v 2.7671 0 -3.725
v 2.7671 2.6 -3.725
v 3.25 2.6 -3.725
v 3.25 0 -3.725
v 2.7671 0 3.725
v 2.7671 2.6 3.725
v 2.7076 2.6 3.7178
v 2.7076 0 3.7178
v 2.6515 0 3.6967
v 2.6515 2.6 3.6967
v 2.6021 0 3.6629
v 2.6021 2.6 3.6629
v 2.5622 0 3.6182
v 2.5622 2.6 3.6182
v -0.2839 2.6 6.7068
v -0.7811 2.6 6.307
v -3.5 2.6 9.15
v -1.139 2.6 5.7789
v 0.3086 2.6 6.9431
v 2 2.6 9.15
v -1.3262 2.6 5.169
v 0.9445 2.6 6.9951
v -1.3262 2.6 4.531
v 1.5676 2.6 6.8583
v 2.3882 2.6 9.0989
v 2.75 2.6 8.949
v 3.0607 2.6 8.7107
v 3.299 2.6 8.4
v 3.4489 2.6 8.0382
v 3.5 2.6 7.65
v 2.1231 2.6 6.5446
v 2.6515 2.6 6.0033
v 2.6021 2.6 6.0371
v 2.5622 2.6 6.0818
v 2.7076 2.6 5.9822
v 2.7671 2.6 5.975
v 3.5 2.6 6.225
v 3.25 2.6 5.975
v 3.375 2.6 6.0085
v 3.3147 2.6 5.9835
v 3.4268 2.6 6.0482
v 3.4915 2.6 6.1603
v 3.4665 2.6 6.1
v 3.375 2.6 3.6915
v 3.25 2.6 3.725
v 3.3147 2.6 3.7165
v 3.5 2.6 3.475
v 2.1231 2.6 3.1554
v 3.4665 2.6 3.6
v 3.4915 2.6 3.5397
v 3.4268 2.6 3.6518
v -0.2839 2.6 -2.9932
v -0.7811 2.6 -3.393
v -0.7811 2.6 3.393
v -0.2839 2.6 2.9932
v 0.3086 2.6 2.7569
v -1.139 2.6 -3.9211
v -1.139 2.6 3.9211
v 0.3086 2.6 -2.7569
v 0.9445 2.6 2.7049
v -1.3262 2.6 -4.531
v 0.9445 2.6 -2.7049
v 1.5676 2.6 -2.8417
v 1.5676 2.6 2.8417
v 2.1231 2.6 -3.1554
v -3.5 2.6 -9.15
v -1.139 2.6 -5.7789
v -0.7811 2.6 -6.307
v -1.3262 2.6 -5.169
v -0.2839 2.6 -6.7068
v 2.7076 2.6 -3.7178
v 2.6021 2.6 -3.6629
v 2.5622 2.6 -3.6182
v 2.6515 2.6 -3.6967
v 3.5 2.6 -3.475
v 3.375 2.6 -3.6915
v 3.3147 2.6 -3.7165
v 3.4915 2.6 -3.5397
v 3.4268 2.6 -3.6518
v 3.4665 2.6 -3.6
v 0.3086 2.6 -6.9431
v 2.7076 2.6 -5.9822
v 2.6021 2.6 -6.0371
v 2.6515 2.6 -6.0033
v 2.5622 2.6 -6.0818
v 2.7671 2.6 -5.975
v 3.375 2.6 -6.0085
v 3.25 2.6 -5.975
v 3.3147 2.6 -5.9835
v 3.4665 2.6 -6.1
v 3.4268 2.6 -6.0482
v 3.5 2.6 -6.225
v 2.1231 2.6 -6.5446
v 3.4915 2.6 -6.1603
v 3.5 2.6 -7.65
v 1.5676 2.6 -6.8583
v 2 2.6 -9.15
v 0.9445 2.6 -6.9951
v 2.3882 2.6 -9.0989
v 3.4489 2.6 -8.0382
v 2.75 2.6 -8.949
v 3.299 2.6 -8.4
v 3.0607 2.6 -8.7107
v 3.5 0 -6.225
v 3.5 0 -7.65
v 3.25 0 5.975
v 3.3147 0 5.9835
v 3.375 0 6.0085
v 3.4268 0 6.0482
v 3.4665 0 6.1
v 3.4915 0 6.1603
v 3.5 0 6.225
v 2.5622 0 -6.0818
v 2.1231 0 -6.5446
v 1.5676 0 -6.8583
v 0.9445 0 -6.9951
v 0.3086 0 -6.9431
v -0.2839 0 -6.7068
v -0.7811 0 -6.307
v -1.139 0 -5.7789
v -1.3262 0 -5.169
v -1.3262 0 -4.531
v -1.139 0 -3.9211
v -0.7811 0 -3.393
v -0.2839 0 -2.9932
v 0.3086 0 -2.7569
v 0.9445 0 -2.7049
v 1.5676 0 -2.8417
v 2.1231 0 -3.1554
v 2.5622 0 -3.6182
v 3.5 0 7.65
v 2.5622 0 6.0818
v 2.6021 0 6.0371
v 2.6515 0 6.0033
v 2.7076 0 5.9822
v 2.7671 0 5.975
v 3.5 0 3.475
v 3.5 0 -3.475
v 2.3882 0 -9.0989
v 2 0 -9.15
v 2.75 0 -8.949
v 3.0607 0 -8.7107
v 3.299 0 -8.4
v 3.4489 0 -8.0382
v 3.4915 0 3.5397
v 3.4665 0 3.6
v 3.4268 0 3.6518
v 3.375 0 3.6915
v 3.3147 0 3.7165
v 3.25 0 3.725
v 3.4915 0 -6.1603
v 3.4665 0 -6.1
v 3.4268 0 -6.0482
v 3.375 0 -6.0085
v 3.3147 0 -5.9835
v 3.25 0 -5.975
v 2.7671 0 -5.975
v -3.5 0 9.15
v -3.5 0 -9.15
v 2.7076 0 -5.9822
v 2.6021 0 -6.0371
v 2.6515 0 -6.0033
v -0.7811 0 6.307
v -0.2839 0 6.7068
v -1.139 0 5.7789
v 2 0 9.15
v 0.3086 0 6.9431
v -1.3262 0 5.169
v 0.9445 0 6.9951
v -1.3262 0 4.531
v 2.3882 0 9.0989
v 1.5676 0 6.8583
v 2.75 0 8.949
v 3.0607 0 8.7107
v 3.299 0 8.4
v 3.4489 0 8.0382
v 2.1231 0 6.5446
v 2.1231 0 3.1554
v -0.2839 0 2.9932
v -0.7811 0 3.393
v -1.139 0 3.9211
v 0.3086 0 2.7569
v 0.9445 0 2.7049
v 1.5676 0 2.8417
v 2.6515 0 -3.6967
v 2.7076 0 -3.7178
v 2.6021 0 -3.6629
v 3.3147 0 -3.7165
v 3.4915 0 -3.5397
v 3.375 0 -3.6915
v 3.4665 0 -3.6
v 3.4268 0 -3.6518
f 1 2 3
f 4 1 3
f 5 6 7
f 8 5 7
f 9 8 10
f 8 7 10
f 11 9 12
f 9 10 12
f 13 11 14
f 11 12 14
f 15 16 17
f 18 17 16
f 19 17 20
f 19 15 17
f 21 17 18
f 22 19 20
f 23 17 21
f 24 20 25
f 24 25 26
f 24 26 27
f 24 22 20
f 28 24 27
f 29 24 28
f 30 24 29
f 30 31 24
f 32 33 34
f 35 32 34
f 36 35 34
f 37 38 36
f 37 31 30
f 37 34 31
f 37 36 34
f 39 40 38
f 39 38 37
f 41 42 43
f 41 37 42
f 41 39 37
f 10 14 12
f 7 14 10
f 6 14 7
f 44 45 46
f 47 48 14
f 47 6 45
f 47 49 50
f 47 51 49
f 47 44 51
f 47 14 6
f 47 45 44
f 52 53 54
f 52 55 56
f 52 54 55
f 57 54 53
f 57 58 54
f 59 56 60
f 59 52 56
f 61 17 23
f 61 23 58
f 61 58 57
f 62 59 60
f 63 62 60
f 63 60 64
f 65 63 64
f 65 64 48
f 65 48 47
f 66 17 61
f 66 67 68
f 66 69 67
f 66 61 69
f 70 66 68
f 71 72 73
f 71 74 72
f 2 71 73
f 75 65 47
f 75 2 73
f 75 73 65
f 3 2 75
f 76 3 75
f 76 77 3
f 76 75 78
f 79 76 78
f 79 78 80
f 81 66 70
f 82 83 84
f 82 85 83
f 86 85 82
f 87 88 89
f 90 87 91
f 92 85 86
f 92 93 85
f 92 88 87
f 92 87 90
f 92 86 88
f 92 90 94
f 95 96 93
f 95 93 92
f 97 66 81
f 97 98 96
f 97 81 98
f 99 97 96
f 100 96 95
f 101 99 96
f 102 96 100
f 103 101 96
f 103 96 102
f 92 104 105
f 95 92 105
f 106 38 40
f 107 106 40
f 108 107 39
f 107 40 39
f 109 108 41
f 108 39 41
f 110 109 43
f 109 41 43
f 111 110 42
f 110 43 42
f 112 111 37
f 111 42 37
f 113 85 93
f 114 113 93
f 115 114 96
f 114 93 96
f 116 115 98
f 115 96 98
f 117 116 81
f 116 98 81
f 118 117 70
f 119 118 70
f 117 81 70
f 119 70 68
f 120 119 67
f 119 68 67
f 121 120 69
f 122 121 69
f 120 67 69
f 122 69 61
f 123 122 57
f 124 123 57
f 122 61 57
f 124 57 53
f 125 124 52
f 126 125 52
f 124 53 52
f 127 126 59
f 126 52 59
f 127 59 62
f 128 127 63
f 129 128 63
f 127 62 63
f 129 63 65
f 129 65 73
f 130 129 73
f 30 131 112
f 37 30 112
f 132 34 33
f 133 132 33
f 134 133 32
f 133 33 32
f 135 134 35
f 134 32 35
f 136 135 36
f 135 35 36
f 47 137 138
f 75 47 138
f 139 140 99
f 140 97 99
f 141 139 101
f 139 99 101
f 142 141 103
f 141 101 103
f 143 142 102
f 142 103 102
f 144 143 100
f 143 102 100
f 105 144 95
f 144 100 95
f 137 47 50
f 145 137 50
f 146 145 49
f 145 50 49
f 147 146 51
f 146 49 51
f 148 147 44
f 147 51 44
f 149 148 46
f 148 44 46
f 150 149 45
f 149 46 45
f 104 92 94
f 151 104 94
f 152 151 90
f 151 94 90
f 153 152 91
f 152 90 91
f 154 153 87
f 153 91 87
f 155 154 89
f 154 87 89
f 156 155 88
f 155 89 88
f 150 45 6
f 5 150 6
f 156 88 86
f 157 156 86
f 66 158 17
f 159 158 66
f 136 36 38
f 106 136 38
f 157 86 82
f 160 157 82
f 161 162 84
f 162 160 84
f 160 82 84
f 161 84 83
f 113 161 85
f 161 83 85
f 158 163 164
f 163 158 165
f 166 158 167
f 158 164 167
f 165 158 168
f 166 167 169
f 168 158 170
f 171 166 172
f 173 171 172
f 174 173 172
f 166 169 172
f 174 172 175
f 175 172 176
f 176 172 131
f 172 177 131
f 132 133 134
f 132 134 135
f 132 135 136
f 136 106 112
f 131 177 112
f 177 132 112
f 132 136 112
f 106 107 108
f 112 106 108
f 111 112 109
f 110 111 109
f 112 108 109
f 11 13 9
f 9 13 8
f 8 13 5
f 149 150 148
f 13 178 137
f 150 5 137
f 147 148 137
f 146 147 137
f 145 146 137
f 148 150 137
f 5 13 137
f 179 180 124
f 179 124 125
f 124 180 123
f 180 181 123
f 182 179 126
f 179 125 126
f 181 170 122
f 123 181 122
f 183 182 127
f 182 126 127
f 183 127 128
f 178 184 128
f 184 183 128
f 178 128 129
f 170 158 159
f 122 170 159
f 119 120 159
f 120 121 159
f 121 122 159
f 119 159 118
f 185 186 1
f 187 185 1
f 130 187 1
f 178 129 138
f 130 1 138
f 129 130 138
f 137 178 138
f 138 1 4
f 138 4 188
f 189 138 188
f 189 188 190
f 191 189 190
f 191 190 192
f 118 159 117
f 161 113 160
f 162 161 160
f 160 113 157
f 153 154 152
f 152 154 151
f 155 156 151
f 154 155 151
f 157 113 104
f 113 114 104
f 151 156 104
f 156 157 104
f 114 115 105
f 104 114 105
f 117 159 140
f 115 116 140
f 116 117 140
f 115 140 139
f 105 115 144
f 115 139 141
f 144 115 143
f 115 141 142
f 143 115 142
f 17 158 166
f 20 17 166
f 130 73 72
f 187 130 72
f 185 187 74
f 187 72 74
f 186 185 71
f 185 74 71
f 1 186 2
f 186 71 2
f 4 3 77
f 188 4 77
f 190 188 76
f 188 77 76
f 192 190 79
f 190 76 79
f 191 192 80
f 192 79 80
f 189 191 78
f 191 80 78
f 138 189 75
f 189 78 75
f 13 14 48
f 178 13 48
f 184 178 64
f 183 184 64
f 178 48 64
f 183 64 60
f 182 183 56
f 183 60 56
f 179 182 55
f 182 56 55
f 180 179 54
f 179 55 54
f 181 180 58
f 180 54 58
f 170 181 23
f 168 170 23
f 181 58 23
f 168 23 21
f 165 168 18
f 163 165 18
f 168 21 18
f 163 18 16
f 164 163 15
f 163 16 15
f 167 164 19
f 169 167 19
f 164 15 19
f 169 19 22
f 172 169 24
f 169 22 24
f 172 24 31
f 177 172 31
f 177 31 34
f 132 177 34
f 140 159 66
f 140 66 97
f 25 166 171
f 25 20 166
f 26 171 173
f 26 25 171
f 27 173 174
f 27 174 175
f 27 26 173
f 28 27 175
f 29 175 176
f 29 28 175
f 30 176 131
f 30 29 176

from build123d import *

# Parameters (mm, degrees)
CROQUIS1_W              = 7
CROQUIS1_H              = 18.3
SALIENTE_EXTRUIR1_DEPTH = 2.6
CORTAR_EXTRUIR2_DEPTH   = 10
REDONDEO1_R             = 1.5


with BuildPart() as part:
    # Croquis1 → Saliente-Extruir1 (new body)
    with BuildSketch(Plane(origin=(0, 0, 0), x_dir=(1, 0, 0), z_dir=(0, 1, 0))):
        Rectangle(CROQUIS1_W, CROQUIS1_H)
    extrude(amount=SALIENTE_EXTRUIR1_DEPTH)

    # Croquis2 → Cortar-Extruir2 (cut)
    with BuildSketch(Plane(origin=(0, 2.6, 0), x_dir=(1, 0, 0), z_dir=(0, 1, 0))):
        with BuildLine():
            ThreePointArc((3.25, 3.725), (3.426776695, 3.651776695), (3.5, 3.475))
            Line((3.5, 3.475), (3.5, 6.225))
            ThreePointArc((3.5, 6.225), (3.426776695, 6.048223305), (3.25, 5.975))
            Line((3.25, 5.975), (2.767072698, 5.975))
            ThreePointArc((2.767072698, 5.975), (2.651546276, 6.003293785), (2.562169292, 6.081770833))
            ThreePointArc((2.562169292, 6.081770833), (-1.35, 4.85), (2.562169292, 3.618229167))
            ThreePointArc((2.562169292, 3.618229167), (2.651546276, 3.696706215), (2.767072698, 3.725))
            Line((2.767072698, 3.725), (3.25, 3.725))
        make_face()
        with BuildLine():
            ThreePointArc((3.5, -3.475), (3.426776695, -3.651776695), (3.25, -3.725))
            Line((3.25, -3.725), (2.767072698, -3.725))
            ThreePointArc((2.767072698, -3.725), (2.651546276, -3.696706215), (2.562169292, -3.618229167))
            ThreePointArc((2.562169292, -3.618229167), (-1.35, -4.85), (2.562169292, -6.081770833))
            ThreePointArc((2.562169292, -6.081770833), (2.651546276, -6.003293785), (2.767072698, -5.975))
            Line((2.767072698, -5.975), (3.25, -5.975))
            ThreePointArc((3.25, -5.975), (3.426776695, -6.048223305), (3.5, -6.225))
            Line((3.5, -6.225), (3.5, -3.475))
        make_face()
    extrude(amount=-CORTAR_EXTRUIR2_DEPTH, mode=Mode.SUBTRACT)

    # Redondeo1
    redondeo1_edges = [part.edges().sort_by_distance(p)[0] for p in [
        (3.5, 1.3, 9.15),
        (3.5, 1.3, -9.15),
    ]]
    fillet(redondeo1_edges, radius=REDONDEO1_R)


solid = part.part
